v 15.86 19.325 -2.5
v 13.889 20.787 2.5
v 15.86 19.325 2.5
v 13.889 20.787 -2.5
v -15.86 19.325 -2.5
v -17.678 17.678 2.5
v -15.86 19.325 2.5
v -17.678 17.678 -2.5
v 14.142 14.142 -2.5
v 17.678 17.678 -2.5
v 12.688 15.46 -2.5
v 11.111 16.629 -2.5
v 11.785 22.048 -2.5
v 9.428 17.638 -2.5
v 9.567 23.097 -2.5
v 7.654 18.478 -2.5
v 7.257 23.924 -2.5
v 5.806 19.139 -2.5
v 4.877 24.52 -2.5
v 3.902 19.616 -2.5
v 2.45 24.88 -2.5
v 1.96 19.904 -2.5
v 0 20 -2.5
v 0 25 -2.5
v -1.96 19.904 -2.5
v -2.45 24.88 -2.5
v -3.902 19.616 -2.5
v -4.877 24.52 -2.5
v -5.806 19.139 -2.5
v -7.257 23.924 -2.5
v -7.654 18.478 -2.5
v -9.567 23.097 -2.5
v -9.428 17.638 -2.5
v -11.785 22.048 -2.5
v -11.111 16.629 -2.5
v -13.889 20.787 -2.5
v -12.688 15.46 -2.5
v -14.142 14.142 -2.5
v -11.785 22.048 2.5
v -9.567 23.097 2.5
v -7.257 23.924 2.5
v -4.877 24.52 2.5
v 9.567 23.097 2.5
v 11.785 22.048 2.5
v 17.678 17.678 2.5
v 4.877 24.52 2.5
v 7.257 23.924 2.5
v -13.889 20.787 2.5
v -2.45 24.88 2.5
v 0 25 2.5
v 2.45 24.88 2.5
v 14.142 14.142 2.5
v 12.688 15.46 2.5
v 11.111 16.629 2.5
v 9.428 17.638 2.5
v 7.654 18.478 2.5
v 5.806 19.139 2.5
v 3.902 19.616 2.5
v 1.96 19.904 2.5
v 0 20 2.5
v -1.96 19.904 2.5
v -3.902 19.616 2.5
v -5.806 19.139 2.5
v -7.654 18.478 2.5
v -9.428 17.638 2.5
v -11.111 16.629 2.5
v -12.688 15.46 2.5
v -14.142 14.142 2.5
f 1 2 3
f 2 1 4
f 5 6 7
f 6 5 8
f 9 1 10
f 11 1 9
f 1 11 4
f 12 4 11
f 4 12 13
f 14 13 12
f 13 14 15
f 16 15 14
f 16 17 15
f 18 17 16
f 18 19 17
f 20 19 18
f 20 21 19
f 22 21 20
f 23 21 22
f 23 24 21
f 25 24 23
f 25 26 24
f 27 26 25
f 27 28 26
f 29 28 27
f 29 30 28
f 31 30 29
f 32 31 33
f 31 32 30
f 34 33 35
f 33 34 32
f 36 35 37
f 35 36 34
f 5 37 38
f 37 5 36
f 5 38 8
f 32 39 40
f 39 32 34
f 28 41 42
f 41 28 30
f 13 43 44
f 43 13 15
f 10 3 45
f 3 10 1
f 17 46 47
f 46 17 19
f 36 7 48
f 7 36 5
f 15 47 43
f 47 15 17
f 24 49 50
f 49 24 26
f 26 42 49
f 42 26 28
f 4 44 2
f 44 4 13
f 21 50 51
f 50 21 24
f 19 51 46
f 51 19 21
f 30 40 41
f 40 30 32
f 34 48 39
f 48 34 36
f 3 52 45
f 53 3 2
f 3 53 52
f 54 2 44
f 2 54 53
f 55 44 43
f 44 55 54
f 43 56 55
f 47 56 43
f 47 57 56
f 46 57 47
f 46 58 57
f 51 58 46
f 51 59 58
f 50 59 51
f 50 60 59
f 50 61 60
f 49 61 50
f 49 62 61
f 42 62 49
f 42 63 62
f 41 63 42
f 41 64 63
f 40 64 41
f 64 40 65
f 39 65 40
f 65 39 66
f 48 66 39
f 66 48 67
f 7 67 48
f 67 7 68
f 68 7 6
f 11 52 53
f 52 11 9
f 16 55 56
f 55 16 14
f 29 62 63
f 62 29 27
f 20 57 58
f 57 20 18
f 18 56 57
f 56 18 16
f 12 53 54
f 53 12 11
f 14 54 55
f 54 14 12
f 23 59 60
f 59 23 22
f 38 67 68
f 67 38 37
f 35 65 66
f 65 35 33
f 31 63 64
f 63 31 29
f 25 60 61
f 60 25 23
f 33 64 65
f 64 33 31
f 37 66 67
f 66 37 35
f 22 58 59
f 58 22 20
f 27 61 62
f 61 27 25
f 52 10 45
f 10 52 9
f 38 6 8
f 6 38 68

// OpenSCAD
//Pie2D(10, 45, 90, 10);
//Circle_Segment_2D(10, 45, 44, $fn=16);
//Pie_2D(diameter=10,from_angle=0, to_angle=90, steps=32);
//Cylinder_Segment(bottom_diameter=30, top_diameter=10, height=10, from_angle=370, to_angle=45, $fn=64);
Flat_Ring_Segment(40,50,5,45,135, center=true, $fn=64);


module Pie_2D(diameter, from_angle=0, to_angle=90, steps=32)
{
    step_size = from_angle < to_angle ?
                (to_angle-from_angle)/steps :
                (360 - (from_angle-to_angle))/steps;
    r=diameter/2;
    points = from_angle < to_angle ?
        [
            for(i = [0:steps])
            [r * cos(from_angle+i*step_size), r * sin(from_angle+i*step_size)]
        ] :
        [
            for(i = [0:steps])
            [r * cos(from_angle+i*step_size), r * sin(from_angle+i*step_size)]
        ];
            
    polygon(concat([[0, 0]], points));
}

module Circle_Segment_2D(diameter=1, from_angle=0, to_angle=45, $fn=$fn)
{
    intersection()
    {
        circle(d=diameter, $fn=$fn);  
        Pie_2D
        (
            diameter=diameter*2,
            from_angle=from_angle,
            to_angle=to_angle,
            steps = 8
        );       
    }
}

module Cylinder_Segment(bottom_diameter, top_diameter, height, from_angle, to_angle, center = false, $fn=$fn)
{
    intersection()
    {
        cylinder(d1=bottom_diameter, d2=top_diameter, h=height, center=center, $fn=$fn);
        linear_extrude(height=height, center=center)
        {
            Pie_2D
            (
                diameter=max(bottom_diameter,top_diameter)*2,
                from_angle=from_angle,
                to_angle=to_angle,
                steps = 8
            );
        }        
    }
        
}

module Flat_Ring(inner_diameter, outer_diameter, height, center=false, $fn=$fn)
{
    difference()
    {
        cylinder(d=outer_diameter, h=height, center=center, $fn=$fn);
        translate([0,0,-1])
        cylinder(d=inner_diameter, h=height+3, center=center, $fn=$fn);
    }
}

module Flat_Ring_Segment(inner_diameter, outer_diameter, height, from_angle=0, to_angle=90, center=false, $fn=$fn)
{
    intersection()
    {
        linear_extrude(height=height, center=center)
        {
            Pie_2D
            (
                diameter=outer_diameter*2,
                from_angle=from_angle,
                to_angle=to_angle,
                steps = 8
            );
        }
        Flat_Ring(  inner_diameter=inner_diameter,
                    outer_diameter=outer_diameter,
                    height=height,
                    center=center,
                    $fn=$fn);
    }
}
